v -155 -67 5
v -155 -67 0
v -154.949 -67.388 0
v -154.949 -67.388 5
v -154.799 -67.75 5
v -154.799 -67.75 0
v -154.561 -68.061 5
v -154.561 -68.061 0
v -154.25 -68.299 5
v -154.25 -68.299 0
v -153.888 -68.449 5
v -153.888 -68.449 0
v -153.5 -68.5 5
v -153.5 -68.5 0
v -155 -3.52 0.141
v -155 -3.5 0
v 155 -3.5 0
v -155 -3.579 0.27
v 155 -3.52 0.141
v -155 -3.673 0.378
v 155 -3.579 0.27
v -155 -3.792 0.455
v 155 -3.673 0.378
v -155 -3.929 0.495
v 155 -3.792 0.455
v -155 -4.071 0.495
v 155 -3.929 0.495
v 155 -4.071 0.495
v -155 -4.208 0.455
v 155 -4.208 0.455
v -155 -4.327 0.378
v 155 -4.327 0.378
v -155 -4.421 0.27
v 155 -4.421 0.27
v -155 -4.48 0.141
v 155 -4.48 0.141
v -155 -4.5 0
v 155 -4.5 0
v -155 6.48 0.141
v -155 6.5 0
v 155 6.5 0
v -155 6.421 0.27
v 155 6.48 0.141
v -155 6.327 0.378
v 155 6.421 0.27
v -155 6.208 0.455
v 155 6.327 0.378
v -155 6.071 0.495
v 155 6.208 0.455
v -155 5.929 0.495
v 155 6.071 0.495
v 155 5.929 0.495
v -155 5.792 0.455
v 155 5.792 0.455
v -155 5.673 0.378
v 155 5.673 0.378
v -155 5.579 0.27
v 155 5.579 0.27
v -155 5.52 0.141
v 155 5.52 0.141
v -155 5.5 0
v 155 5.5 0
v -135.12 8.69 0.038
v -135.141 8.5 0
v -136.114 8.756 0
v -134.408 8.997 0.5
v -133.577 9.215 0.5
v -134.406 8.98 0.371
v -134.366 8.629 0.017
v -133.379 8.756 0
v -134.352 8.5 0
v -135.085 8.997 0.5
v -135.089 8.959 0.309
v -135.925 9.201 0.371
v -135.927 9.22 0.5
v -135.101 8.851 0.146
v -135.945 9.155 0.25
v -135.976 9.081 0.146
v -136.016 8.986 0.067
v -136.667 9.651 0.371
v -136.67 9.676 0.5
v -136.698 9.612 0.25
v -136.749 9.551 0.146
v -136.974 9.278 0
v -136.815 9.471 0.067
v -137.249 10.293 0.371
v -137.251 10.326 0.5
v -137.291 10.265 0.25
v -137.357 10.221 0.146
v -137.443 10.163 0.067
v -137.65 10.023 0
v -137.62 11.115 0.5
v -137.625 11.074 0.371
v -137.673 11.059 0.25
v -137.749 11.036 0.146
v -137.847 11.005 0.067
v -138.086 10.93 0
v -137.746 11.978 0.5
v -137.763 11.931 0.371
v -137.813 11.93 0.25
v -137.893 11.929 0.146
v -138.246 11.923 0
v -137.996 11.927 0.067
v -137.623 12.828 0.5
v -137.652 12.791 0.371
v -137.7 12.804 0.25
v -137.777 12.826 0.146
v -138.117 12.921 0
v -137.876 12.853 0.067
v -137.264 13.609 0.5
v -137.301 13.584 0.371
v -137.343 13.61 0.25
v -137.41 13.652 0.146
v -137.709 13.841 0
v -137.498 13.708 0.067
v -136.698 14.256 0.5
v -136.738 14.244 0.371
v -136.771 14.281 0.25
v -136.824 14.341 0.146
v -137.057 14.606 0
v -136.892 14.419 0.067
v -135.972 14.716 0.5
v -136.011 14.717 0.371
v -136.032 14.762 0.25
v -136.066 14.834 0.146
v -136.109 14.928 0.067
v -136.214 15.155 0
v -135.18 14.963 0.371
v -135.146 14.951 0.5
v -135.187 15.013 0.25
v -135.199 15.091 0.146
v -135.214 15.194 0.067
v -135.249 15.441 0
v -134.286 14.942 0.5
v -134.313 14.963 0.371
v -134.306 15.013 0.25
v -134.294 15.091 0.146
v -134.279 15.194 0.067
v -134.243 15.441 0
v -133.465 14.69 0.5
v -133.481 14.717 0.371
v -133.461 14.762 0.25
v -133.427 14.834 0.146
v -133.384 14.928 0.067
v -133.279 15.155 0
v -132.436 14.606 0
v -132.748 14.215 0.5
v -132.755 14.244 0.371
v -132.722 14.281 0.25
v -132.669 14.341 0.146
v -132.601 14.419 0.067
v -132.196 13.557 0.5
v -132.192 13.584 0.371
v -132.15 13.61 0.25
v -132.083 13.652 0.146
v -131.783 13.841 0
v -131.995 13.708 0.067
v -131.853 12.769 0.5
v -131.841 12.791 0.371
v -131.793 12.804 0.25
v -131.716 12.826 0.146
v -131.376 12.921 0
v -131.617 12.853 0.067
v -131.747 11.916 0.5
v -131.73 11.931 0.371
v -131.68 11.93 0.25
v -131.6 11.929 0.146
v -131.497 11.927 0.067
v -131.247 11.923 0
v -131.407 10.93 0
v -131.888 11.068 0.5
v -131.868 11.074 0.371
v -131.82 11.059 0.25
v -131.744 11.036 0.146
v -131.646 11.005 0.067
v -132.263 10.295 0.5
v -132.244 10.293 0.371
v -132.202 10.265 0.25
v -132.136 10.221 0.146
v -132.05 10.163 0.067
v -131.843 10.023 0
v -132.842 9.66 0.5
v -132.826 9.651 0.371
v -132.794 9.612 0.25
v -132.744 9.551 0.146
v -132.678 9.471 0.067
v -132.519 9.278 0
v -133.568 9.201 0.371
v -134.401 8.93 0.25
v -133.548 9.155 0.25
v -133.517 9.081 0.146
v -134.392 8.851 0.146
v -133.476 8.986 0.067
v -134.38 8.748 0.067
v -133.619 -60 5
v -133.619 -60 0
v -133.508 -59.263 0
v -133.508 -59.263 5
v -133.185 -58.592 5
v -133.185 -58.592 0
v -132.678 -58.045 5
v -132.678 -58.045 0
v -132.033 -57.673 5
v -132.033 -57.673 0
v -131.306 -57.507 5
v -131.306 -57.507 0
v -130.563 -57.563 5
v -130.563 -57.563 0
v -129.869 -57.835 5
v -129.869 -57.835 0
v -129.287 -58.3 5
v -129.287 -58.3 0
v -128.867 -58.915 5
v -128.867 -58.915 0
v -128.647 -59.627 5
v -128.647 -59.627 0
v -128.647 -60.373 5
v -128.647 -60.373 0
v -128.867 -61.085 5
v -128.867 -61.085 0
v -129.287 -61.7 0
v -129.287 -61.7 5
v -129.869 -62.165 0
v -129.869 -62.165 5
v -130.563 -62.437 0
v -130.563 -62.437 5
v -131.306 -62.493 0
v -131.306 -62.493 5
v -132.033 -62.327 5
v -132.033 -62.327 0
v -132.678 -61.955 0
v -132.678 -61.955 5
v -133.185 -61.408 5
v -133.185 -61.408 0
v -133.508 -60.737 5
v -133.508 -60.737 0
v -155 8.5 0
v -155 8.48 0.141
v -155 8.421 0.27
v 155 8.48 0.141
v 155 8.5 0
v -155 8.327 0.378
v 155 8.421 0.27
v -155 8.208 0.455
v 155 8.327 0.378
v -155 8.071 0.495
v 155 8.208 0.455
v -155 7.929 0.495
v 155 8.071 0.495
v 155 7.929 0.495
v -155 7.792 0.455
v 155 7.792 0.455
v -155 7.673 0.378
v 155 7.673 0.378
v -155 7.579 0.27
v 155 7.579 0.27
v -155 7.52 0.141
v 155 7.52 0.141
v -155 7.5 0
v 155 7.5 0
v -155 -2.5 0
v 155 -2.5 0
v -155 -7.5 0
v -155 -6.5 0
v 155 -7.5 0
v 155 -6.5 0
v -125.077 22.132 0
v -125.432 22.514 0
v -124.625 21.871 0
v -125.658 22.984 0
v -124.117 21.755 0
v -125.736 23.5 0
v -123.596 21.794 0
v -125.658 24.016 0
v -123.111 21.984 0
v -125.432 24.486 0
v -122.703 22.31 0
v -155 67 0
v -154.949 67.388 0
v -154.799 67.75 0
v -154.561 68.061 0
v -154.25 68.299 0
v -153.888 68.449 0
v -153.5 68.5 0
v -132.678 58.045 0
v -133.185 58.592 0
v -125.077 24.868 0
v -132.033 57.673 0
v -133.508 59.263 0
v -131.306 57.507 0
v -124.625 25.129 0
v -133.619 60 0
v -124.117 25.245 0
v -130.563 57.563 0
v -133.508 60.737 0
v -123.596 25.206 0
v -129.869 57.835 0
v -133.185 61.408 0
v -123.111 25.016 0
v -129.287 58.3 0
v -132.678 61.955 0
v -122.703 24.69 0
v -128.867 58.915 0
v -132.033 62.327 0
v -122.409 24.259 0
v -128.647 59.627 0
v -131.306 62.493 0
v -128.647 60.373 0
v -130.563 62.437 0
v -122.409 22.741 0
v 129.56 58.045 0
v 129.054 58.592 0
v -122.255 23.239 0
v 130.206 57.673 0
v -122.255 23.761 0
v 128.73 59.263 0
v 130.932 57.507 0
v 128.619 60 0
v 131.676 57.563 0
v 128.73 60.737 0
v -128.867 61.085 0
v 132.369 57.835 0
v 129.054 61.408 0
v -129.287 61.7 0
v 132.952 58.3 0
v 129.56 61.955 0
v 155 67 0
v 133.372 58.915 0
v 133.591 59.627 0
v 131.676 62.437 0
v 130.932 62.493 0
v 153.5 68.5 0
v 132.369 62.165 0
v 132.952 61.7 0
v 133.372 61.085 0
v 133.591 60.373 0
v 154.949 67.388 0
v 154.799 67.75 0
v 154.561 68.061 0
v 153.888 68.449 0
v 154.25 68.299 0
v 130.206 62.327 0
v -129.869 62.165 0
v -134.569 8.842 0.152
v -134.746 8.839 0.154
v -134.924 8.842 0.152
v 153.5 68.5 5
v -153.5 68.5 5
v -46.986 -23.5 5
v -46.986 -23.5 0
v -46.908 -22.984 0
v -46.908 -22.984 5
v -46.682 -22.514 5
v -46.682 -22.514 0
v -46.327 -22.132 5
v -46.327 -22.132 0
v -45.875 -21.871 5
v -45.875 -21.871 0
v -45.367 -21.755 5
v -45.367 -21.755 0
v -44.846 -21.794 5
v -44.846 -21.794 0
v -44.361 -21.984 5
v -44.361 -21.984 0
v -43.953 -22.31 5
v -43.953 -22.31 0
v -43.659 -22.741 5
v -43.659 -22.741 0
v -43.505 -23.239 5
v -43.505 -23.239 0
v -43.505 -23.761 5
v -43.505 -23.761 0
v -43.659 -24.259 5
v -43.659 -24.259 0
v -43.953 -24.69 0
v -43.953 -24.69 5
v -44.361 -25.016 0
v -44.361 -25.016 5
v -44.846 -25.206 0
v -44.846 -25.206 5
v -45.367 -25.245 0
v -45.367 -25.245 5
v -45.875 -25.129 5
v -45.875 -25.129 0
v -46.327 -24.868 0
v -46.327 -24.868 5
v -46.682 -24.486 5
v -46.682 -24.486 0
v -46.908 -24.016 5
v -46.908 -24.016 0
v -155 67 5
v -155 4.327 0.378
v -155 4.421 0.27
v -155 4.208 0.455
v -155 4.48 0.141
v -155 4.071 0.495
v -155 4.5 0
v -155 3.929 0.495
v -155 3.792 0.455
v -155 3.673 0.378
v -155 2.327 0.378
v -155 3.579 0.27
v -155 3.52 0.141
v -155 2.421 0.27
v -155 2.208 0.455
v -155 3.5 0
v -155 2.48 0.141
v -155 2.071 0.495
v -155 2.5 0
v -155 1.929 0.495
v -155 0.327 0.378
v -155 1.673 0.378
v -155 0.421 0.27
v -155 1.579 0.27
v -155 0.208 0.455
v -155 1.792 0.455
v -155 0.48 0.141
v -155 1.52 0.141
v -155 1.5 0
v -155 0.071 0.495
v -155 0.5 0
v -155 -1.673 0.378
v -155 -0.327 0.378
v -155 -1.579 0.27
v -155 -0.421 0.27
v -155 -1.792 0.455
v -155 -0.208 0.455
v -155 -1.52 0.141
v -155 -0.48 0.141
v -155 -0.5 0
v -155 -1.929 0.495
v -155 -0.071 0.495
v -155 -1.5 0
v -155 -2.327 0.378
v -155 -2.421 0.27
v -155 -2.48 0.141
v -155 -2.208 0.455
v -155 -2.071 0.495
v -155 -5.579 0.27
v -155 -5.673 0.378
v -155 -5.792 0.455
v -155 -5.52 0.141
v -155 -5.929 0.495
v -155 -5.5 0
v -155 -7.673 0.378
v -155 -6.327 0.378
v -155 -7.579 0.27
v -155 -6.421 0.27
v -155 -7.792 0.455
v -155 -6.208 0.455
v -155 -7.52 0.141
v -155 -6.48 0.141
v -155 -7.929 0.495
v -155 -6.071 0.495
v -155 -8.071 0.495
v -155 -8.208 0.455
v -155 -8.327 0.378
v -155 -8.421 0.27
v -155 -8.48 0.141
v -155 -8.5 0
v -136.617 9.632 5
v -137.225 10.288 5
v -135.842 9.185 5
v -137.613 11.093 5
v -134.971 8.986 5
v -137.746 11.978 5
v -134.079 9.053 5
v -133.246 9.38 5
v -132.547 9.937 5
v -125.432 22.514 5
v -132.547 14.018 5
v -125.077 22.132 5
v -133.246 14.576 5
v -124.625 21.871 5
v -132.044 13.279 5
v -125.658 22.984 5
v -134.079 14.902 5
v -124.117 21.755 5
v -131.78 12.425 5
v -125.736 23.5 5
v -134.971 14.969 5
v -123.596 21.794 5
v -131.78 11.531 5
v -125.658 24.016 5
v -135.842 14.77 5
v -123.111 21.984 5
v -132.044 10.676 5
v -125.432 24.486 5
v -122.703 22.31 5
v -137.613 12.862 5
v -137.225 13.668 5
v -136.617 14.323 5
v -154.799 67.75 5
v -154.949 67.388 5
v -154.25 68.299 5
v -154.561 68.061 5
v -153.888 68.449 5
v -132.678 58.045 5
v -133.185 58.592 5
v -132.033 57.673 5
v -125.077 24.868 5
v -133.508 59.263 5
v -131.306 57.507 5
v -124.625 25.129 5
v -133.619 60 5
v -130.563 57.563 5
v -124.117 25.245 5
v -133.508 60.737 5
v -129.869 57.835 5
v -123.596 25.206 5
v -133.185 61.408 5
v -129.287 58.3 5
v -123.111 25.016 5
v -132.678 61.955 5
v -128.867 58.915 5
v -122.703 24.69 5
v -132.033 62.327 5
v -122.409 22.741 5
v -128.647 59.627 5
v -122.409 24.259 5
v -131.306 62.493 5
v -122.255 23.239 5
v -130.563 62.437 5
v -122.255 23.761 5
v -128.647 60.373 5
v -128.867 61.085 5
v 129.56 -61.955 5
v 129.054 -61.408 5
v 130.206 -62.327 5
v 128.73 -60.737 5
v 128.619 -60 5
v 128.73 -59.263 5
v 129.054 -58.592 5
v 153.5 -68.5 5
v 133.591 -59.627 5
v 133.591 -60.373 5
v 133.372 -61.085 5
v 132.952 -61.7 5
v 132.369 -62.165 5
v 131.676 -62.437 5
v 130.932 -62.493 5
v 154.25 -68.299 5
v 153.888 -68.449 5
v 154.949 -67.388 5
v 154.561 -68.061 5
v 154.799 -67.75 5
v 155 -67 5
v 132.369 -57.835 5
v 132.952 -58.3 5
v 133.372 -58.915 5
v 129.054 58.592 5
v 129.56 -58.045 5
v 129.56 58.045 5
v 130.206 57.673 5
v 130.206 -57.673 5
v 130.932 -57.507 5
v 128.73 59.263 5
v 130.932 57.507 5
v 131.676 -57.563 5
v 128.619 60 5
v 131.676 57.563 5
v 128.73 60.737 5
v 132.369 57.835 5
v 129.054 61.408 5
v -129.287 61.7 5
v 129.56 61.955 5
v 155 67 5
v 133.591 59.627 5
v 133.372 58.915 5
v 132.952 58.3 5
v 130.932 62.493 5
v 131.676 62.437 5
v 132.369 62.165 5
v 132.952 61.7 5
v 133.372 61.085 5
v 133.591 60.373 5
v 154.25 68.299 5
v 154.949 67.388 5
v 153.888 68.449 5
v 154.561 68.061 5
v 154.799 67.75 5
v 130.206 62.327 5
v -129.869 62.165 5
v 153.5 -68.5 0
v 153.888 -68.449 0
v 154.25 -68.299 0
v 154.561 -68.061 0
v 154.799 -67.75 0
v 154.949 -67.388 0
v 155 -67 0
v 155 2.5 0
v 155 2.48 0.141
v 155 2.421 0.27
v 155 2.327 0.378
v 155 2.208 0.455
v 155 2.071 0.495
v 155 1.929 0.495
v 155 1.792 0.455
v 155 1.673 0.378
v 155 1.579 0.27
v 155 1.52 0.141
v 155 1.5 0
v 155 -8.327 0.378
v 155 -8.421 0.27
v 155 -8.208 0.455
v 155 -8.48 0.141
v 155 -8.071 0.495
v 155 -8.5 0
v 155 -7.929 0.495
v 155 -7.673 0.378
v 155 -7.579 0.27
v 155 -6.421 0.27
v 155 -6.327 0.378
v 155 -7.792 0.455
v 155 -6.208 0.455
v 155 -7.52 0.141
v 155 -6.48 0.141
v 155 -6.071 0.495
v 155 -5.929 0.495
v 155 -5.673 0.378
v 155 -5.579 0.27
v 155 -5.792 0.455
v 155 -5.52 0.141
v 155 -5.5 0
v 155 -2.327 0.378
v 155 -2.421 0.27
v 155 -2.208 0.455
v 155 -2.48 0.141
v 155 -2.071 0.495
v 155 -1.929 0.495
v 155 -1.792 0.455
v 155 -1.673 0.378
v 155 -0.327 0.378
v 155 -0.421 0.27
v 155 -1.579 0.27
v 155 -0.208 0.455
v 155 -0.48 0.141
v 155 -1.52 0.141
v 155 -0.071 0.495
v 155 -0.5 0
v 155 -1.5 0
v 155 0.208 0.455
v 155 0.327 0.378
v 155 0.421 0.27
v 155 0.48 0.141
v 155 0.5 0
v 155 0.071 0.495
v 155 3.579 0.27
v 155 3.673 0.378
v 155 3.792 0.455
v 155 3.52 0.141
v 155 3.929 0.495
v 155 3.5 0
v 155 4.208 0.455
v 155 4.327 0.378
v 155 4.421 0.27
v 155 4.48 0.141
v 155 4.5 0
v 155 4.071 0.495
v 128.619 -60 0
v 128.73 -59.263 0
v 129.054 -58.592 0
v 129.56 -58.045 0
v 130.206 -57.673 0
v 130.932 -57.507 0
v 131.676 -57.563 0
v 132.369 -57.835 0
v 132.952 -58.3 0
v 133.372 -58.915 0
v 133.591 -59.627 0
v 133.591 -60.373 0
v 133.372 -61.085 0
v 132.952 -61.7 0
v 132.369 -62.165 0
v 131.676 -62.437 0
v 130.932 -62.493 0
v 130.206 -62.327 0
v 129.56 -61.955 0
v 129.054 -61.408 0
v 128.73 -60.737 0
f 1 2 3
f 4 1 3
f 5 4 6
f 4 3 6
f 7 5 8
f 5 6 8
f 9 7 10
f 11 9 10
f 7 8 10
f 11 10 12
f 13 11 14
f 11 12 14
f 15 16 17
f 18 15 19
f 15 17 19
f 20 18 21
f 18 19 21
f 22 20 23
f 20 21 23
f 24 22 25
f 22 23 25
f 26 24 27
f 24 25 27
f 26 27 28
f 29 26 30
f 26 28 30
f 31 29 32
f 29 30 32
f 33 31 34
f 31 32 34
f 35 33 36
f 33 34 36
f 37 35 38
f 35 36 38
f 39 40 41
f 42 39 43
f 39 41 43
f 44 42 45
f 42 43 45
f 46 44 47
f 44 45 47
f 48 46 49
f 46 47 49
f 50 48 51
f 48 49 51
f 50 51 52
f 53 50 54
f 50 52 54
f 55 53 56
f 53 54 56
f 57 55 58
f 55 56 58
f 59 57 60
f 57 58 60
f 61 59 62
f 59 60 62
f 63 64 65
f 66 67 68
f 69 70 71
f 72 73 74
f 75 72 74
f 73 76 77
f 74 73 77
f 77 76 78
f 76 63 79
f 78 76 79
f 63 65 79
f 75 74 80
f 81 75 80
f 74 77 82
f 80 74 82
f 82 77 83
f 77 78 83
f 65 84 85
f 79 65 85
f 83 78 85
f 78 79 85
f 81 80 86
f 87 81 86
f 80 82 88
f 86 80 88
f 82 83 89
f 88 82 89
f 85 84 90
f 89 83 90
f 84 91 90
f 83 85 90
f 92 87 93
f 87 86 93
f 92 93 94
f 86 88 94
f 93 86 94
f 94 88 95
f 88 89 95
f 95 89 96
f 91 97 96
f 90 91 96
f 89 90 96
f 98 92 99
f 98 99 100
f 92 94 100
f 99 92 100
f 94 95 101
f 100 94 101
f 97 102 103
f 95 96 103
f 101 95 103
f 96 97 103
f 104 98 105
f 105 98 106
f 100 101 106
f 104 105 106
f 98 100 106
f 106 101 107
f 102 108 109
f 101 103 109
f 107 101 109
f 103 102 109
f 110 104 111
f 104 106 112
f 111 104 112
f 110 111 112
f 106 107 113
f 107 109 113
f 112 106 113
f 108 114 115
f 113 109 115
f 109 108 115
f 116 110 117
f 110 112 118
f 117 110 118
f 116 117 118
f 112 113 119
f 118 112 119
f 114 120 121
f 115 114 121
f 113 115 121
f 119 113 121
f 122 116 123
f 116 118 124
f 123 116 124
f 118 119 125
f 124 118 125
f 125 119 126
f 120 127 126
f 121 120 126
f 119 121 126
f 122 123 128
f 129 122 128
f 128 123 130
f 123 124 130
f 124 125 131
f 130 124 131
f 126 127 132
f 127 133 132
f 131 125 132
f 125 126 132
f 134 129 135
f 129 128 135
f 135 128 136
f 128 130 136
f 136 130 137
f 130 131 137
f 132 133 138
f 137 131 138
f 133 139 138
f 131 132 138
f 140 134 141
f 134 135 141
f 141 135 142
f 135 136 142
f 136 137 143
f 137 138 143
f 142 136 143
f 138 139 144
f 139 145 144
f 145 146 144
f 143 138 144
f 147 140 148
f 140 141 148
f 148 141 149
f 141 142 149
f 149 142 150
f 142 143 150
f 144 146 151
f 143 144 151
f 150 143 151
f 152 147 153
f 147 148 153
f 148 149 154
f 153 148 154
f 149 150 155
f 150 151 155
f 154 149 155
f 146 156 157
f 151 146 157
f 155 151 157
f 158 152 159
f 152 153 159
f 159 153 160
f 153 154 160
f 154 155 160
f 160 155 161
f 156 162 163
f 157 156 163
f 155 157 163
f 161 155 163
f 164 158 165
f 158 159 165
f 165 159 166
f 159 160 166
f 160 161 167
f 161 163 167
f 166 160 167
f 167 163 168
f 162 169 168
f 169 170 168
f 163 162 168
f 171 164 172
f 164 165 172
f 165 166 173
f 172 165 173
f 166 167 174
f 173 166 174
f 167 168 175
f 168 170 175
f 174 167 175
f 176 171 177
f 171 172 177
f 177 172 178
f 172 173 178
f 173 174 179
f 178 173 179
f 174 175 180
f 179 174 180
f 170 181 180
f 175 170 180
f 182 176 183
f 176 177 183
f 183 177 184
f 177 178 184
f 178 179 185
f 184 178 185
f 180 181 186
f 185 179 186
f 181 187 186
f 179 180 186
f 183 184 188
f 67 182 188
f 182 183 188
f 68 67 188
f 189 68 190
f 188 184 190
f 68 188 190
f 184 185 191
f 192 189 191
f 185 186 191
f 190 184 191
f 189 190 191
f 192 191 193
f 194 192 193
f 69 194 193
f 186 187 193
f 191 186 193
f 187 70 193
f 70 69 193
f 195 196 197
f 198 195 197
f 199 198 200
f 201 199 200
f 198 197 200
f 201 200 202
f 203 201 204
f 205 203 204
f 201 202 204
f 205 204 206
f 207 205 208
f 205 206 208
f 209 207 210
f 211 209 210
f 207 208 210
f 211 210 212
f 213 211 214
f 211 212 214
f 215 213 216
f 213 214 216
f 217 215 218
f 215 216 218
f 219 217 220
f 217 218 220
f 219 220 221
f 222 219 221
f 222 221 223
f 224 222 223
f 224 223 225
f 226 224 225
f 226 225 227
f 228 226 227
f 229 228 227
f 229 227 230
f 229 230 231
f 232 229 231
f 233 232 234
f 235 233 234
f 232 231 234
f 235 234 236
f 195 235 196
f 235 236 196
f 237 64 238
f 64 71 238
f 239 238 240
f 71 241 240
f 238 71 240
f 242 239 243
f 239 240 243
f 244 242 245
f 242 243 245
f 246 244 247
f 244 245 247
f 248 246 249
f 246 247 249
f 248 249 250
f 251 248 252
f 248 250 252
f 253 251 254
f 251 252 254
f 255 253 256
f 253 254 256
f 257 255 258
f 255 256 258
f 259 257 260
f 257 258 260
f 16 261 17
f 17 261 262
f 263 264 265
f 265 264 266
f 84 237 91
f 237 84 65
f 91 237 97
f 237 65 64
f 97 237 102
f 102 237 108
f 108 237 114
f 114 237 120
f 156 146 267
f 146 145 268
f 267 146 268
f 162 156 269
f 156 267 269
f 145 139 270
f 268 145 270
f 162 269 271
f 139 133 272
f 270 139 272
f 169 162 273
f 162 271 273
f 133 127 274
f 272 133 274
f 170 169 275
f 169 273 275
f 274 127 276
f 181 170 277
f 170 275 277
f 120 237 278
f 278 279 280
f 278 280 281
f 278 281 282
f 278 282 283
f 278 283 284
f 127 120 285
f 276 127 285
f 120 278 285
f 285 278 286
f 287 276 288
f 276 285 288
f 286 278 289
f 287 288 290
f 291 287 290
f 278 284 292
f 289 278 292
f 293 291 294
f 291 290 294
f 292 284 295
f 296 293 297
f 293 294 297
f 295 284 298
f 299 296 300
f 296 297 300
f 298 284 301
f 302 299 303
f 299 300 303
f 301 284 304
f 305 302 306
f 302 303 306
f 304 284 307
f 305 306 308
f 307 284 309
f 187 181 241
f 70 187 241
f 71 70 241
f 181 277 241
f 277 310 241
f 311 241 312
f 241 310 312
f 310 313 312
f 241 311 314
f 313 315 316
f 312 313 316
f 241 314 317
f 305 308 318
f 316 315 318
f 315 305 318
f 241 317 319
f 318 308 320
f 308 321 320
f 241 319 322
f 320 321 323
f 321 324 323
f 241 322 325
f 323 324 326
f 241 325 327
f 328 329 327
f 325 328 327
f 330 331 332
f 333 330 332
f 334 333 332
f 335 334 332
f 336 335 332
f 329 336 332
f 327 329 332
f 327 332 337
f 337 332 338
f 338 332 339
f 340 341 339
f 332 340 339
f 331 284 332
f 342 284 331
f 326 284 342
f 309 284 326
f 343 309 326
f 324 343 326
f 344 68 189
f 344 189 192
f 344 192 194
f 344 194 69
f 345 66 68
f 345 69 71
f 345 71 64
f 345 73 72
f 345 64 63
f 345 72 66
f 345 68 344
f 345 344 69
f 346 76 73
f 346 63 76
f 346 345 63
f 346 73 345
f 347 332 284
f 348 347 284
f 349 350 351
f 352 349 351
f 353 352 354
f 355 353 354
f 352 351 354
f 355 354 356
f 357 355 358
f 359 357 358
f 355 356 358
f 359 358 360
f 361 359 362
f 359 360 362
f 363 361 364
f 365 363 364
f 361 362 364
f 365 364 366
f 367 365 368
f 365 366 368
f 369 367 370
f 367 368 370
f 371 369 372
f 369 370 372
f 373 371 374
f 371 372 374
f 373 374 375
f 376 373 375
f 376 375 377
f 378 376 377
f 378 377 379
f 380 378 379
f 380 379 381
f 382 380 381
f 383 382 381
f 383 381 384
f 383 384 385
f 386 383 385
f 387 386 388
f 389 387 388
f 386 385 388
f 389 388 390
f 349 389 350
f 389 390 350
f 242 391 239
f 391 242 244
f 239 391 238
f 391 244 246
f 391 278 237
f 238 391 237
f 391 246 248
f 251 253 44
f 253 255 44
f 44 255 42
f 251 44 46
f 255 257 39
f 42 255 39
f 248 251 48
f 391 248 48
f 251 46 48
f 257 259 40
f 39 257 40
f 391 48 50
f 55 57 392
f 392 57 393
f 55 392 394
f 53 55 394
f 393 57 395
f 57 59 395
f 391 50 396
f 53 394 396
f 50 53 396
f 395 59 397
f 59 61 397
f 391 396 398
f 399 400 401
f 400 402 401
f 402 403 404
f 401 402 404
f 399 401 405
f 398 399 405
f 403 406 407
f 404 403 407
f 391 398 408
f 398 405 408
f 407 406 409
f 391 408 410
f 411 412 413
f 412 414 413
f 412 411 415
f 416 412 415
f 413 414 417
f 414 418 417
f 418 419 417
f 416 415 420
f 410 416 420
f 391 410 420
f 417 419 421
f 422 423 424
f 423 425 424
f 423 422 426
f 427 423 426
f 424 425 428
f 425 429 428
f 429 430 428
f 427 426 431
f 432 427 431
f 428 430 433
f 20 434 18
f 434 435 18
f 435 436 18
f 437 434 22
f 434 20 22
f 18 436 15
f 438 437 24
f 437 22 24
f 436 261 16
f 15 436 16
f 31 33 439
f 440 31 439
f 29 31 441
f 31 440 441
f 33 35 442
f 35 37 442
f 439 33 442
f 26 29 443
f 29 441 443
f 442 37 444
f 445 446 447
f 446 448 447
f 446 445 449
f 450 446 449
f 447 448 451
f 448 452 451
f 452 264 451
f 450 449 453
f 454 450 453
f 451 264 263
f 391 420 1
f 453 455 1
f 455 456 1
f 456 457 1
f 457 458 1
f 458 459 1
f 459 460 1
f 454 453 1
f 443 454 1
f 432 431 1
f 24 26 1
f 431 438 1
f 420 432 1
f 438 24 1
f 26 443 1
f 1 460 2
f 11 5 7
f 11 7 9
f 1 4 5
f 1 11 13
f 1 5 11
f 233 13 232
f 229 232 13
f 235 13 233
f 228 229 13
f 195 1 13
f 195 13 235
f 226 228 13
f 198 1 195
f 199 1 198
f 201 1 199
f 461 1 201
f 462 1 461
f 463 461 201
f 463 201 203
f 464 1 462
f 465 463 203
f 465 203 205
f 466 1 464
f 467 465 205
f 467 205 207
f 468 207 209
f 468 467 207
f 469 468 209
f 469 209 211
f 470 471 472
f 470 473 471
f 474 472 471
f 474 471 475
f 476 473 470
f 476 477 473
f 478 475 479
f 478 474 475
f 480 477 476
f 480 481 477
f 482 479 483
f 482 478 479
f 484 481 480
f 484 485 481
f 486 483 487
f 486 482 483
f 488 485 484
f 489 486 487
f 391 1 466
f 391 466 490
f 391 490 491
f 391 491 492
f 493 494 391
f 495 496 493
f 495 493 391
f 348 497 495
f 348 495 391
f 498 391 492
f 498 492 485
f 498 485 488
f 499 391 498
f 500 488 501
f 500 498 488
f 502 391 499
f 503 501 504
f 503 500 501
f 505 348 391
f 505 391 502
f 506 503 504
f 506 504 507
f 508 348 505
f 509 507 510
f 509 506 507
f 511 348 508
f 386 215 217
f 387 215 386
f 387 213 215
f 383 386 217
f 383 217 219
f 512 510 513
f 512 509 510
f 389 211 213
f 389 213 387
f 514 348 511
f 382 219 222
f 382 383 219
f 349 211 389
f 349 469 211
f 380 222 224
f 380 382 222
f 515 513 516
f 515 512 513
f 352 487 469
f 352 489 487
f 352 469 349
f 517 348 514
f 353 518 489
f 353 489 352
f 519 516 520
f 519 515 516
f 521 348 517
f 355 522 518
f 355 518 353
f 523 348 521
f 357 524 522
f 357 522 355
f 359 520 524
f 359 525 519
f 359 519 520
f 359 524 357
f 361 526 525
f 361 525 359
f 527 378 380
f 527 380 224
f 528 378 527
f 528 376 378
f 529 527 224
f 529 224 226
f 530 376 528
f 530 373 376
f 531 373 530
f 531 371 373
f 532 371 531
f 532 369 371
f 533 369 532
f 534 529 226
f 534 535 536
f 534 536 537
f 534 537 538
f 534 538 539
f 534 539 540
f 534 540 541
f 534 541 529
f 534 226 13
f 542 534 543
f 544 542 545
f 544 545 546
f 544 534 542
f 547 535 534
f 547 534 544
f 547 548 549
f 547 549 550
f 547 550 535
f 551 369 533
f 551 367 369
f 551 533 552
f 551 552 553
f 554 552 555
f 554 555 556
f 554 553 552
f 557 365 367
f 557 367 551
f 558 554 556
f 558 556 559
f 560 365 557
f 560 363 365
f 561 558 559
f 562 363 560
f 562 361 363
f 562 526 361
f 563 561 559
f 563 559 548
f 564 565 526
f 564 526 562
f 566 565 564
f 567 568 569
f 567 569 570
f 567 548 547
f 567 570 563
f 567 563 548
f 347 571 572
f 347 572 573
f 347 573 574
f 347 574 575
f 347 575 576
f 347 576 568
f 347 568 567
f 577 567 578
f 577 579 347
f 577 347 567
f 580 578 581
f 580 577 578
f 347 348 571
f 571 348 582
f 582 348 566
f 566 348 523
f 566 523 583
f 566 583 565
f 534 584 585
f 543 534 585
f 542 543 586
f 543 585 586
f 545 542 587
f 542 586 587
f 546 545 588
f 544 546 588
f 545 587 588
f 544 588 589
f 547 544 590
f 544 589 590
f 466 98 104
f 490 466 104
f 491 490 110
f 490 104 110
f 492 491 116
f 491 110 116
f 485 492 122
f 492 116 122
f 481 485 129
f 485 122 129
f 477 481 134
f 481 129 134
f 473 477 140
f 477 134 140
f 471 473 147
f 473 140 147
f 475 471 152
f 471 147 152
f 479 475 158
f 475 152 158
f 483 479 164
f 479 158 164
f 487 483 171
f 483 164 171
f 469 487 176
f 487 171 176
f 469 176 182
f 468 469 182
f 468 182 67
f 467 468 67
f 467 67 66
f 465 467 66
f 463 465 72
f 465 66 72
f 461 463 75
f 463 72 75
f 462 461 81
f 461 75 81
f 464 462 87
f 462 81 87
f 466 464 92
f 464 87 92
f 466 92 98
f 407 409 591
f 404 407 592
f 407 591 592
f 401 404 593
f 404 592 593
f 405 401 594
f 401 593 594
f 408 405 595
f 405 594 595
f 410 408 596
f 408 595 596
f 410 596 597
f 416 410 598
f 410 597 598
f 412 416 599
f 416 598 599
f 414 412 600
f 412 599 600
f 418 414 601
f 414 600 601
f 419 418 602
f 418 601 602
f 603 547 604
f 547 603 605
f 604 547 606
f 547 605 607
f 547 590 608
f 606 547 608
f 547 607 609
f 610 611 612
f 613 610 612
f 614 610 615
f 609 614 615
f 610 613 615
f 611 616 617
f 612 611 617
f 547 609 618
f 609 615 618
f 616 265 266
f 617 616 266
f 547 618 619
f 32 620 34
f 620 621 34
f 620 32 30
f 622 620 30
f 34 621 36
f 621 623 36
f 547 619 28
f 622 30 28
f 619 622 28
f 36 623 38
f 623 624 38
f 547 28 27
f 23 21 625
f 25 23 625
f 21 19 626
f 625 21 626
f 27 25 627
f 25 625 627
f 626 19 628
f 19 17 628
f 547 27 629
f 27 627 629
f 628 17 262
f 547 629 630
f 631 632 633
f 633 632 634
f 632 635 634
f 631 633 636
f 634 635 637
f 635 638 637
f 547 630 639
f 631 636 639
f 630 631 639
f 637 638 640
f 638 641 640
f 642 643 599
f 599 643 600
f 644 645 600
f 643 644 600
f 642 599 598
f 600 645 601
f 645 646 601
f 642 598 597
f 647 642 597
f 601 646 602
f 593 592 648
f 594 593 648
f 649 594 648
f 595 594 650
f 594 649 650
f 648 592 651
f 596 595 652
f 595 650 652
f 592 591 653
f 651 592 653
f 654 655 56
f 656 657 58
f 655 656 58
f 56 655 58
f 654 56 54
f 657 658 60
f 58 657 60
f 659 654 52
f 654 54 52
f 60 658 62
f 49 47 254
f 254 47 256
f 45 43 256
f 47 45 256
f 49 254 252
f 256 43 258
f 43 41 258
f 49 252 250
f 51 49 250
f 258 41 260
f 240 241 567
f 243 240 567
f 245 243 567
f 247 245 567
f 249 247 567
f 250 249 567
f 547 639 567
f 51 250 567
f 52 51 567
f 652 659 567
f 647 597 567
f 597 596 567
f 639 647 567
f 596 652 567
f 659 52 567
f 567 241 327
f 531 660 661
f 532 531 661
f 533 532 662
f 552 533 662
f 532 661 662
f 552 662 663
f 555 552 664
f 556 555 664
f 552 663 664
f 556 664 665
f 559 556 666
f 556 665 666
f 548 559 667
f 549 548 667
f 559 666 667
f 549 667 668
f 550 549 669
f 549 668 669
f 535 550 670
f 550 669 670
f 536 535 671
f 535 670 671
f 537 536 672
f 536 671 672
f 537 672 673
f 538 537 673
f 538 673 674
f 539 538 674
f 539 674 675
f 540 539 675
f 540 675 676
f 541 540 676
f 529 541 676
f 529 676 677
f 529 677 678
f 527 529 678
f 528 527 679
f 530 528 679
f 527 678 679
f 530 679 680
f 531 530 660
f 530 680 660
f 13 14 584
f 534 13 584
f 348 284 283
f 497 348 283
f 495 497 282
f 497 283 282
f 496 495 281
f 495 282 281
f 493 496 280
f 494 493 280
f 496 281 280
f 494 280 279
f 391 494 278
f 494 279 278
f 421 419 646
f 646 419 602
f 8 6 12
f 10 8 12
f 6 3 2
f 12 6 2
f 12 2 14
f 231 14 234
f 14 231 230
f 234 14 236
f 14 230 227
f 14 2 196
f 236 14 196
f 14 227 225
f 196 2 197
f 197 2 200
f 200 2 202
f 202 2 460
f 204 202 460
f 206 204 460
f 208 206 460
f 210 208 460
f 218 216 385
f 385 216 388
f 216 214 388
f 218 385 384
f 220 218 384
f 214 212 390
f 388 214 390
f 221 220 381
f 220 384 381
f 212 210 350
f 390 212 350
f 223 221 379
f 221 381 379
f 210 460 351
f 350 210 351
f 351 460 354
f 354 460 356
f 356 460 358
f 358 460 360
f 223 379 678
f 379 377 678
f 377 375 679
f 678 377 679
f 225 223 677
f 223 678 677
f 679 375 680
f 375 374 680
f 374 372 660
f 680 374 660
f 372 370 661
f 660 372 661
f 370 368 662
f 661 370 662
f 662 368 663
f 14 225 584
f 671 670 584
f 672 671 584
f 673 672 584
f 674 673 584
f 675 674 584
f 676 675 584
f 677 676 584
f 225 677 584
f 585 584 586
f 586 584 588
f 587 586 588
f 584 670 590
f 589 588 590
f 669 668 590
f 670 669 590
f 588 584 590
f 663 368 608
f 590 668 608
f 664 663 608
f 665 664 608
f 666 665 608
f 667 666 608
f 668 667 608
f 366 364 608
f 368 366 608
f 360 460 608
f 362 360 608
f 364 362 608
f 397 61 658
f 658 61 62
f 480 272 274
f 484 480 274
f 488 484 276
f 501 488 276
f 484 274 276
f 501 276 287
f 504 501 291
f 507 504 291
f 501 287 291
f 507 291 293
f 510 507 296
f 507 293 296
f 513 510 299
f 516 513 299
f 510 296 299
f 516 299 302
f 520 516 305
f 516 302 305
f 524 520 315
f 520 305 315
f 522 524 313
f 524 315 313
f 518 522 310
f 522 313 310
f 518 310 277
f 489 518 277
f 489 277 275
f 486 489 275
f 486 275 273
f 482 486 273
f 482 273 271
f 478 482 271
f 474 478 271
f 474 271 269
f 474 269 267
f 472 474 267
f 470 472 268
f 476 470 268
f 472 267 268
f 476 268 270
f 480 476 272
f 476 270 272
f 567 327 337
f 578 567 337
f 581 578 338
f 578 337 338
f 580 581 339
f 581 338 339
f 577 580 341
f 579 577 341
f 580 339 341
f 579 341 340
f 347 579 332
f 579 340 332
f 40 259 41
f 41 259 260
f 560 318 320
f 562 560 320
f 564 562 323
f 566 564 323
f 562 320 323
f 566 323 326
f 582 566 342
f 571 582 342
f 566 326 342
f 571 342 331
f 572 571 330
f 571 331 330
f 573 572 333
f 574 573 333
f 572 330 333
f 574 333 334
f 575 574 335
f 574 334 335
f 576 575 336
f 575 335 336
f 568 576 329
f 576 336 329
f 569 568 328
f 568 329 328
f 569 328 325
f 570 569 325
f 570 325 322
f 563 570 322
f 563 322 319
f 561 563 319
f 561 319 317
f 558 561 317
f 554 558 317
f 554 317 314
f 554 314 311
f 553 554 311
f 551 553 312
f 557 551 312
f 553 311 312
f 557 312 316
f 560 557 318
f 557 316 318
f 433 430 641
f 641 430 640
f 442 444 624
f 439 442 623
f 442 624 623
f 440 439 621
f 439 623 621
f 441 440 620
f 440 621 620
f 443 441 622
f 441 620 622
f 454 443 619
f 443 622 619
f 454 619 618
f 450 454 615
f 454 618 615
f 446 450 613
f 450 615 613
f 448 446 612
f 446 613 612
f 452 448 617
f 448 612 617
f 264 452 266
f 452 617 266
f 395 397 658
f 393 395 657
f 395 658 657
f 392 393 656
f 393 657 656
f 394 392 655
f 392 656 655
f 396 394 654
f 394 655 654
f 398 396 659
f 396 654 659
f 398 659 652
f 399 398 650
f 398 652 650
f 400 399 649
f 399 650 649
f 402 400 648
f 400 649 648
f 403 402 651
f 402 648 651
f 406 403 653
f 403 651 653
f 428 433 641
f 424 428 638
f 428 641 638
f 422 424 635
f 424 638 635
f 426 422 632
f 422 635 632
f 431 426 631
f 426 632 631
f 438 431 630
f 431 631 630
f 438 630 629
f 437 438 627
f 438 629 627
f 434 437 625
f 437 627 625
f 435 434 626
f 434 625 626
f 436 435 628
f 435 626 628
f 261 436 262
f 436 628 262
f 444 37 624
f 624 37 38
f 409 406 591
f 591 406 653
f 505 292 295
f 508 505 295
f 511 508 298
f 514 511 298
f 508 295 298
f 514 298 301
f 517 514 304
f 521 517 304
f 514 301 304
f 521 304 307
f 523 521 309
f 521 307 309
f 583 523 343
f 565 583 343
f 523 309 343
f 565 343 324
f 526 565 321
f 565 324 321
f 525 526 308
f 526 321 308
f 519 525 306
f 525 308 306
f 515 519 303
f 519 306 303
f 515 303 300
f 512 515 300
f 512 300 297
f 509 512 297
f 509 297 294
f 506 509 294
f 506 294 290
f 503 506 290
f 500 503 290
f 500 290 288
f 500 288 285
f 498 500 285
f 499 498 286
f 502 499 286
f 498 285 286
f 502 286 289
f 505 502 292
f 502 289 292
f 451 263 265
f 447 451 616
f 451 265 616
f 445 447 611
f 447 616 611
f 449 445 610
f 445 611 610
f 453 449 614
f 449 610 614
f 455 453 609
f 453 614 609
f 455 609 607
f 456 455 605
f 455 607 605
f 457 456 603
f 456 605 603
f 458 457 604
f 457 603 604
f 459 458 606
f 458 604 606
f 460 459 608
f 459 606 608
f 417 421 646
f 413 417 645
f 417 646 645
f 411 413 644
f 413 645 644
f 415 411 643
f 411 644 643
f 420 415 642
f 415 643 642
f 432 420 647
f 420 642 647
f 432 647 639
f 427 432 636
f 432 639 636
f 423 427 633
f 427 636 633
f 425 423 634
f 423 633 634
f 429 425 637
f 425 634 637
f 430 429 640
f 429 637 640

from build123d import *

# Parameters (mm, degrees)
BOSS_EXTRU_1_DEPTH           = 5
ESQUISSE2_R                  = 2.5
ENL_V_MAT_EXTRU_1_DEPTH      = 5
ESQUISSE3_R                  = 0.5
ENL_V_MAT_EXTRU_2_DEPTH      = 1
ENL_V_MAT_EXTRU_2_DEPTH_BACK = 311
ESQUISSE4_R                  = 1.75
ENL_V_MAT_EXTRU_3_DEPTH      = 5
ESQUISSE6_R                  = 3
ENL_V_MAT_EXTRU_4_DEPTH      = 5
CONG_1_R                     = 0.5


with BuildPart() as part:
    # Esquisse1 → Boss.-Extru.1 (new body)
    with BuildSketch(Plane.XY):
        with BuildLine():
            Line((-153.5, -68.5), (153.5, -68.5))
            ThreePointArc((153.5, -68.5), (154.560660172, -68.060660172), (155, -67))
            Line((155, -67), (155, 67))
            ThreePointArc((155, 67), (154.560660172, 68.060660172), (153.5, 68.5))
            Line((153.5, 68.5), (-153.5, 68.5))
            ThreePointArc((-153.5, 68.5), (-154.560660172, 68.060660172), (-155, 67))
            Line((-155, 67), (-155, -67))
            ThreePointArc((-155, -67), (-154.560660172, -68.060660172), (-153.5, -68.5))
        make_face()
    extrude(amount=BOSS_EXTRU_1_DEPTH)

    # Esquisse2 → Enlèv. mat.-Extru.1 (cut)
    with BuildSketch(Plane(origin=(0, 0, 0), x_dir=(-1, 0, 0), z_dir=(0, 0, -1))):
        with Locations((-131.119201541, -60)):
            Circle(ESQUISSE2_R)
        with Locations((-131.119201541, 60)):
            Circle(ESQUISSE2_R)
        with Locations((131.119201541, 60)):
            Circle(ESQUISSE2_R)
        with Locations((131.119201541, -60)):
            Circle(ESQUISSE2_R)
    extrude(amount=-ENL_V_MAT_EXTRU_1_DEPTH, mode=Mode.SUBTRACT)

    # Esquisse3 → Enlèv. mat.-Extru.2 (cut, two sides)
    with BuildSketch(Plane(origin=(155, 0, 0), x_dir=(0, 0, -1), z_dir=(1, 0, 0))) as enl_v_mat_extru_2_sk:
        Circle(ESQUISSE3_R)
        with Locations((0, 2)):
            Circle(ESQUISSE3_R)
        with Locations((0, 4)):
            Circle(ESQUISSE3_R)
        with Locations((0, 6)):
            Circle(ESQUISSE3_R)
        with Locations((0, 8)):
            Circle(ESQUISSE3_R)
        with Locations((0, -2)):
            Circle(ESQUISSE3_R)
        with Locations((0, -4)):
            Circle(ESQUISSE3_R)
        with Locations((0, -6)):
            Circle(ESQUISSE3_R)
        with Locations((0, -8)):
            Circle(ESQUISSE3_R)
    extrude(amount=ENL_V_MAT_EXTRU_2_DEPTH, mode=Mode.SUBTRACT)
    extrude(enl_v_mat_extru_2_sk.sketch, amount=-ENL_V_MAT_EXTRU_2_DEPTH_BACK, mode=Mode.SUBTRACT)

    # Esquisse4 → Enlèv. mat.-Extru.3 (cut)
    with BuildSketch(Plane(origin=(0, 0, 0), x_dir=(-1, 0, 0), z_dir=(0, 0, -1))):
        with Locations((45.235873588, -23.5)):
            Circle(ESQUISSE4_R)
        with Locations((123.985873588, 23.5)):
            Circle(ESQUISSE4_R)
    extrude(amount=-ENL_V_MAT_EXTRU_3_DEPTH, mode=Mode.SUBTRACT)

    # Esquisse6 → Enlèv. mat.-Extru.4 (cut)
    with BuildSketch(Plane(origin=(0, 0, 0), x_dir=(-1, 0, 0), z_dir=(0, 0, -1))):
        with Locations((134.746454325, 11.977670931)):
            Circle(ESQUISSE6_R)
    extrude(amount=-ENL_V_MAT_EXTRU_4_DEPTH, mode=Mode.SUBTRACT)

    # Congé1
    cong_1_edges = [part.edges().sort_by_distance(p)[0] for p in [
        (-131.746454325, 11.977670931, 0),
    ]]
    fillet(cong_1_edges, radius=CONG_1_R)


solid = part.part
